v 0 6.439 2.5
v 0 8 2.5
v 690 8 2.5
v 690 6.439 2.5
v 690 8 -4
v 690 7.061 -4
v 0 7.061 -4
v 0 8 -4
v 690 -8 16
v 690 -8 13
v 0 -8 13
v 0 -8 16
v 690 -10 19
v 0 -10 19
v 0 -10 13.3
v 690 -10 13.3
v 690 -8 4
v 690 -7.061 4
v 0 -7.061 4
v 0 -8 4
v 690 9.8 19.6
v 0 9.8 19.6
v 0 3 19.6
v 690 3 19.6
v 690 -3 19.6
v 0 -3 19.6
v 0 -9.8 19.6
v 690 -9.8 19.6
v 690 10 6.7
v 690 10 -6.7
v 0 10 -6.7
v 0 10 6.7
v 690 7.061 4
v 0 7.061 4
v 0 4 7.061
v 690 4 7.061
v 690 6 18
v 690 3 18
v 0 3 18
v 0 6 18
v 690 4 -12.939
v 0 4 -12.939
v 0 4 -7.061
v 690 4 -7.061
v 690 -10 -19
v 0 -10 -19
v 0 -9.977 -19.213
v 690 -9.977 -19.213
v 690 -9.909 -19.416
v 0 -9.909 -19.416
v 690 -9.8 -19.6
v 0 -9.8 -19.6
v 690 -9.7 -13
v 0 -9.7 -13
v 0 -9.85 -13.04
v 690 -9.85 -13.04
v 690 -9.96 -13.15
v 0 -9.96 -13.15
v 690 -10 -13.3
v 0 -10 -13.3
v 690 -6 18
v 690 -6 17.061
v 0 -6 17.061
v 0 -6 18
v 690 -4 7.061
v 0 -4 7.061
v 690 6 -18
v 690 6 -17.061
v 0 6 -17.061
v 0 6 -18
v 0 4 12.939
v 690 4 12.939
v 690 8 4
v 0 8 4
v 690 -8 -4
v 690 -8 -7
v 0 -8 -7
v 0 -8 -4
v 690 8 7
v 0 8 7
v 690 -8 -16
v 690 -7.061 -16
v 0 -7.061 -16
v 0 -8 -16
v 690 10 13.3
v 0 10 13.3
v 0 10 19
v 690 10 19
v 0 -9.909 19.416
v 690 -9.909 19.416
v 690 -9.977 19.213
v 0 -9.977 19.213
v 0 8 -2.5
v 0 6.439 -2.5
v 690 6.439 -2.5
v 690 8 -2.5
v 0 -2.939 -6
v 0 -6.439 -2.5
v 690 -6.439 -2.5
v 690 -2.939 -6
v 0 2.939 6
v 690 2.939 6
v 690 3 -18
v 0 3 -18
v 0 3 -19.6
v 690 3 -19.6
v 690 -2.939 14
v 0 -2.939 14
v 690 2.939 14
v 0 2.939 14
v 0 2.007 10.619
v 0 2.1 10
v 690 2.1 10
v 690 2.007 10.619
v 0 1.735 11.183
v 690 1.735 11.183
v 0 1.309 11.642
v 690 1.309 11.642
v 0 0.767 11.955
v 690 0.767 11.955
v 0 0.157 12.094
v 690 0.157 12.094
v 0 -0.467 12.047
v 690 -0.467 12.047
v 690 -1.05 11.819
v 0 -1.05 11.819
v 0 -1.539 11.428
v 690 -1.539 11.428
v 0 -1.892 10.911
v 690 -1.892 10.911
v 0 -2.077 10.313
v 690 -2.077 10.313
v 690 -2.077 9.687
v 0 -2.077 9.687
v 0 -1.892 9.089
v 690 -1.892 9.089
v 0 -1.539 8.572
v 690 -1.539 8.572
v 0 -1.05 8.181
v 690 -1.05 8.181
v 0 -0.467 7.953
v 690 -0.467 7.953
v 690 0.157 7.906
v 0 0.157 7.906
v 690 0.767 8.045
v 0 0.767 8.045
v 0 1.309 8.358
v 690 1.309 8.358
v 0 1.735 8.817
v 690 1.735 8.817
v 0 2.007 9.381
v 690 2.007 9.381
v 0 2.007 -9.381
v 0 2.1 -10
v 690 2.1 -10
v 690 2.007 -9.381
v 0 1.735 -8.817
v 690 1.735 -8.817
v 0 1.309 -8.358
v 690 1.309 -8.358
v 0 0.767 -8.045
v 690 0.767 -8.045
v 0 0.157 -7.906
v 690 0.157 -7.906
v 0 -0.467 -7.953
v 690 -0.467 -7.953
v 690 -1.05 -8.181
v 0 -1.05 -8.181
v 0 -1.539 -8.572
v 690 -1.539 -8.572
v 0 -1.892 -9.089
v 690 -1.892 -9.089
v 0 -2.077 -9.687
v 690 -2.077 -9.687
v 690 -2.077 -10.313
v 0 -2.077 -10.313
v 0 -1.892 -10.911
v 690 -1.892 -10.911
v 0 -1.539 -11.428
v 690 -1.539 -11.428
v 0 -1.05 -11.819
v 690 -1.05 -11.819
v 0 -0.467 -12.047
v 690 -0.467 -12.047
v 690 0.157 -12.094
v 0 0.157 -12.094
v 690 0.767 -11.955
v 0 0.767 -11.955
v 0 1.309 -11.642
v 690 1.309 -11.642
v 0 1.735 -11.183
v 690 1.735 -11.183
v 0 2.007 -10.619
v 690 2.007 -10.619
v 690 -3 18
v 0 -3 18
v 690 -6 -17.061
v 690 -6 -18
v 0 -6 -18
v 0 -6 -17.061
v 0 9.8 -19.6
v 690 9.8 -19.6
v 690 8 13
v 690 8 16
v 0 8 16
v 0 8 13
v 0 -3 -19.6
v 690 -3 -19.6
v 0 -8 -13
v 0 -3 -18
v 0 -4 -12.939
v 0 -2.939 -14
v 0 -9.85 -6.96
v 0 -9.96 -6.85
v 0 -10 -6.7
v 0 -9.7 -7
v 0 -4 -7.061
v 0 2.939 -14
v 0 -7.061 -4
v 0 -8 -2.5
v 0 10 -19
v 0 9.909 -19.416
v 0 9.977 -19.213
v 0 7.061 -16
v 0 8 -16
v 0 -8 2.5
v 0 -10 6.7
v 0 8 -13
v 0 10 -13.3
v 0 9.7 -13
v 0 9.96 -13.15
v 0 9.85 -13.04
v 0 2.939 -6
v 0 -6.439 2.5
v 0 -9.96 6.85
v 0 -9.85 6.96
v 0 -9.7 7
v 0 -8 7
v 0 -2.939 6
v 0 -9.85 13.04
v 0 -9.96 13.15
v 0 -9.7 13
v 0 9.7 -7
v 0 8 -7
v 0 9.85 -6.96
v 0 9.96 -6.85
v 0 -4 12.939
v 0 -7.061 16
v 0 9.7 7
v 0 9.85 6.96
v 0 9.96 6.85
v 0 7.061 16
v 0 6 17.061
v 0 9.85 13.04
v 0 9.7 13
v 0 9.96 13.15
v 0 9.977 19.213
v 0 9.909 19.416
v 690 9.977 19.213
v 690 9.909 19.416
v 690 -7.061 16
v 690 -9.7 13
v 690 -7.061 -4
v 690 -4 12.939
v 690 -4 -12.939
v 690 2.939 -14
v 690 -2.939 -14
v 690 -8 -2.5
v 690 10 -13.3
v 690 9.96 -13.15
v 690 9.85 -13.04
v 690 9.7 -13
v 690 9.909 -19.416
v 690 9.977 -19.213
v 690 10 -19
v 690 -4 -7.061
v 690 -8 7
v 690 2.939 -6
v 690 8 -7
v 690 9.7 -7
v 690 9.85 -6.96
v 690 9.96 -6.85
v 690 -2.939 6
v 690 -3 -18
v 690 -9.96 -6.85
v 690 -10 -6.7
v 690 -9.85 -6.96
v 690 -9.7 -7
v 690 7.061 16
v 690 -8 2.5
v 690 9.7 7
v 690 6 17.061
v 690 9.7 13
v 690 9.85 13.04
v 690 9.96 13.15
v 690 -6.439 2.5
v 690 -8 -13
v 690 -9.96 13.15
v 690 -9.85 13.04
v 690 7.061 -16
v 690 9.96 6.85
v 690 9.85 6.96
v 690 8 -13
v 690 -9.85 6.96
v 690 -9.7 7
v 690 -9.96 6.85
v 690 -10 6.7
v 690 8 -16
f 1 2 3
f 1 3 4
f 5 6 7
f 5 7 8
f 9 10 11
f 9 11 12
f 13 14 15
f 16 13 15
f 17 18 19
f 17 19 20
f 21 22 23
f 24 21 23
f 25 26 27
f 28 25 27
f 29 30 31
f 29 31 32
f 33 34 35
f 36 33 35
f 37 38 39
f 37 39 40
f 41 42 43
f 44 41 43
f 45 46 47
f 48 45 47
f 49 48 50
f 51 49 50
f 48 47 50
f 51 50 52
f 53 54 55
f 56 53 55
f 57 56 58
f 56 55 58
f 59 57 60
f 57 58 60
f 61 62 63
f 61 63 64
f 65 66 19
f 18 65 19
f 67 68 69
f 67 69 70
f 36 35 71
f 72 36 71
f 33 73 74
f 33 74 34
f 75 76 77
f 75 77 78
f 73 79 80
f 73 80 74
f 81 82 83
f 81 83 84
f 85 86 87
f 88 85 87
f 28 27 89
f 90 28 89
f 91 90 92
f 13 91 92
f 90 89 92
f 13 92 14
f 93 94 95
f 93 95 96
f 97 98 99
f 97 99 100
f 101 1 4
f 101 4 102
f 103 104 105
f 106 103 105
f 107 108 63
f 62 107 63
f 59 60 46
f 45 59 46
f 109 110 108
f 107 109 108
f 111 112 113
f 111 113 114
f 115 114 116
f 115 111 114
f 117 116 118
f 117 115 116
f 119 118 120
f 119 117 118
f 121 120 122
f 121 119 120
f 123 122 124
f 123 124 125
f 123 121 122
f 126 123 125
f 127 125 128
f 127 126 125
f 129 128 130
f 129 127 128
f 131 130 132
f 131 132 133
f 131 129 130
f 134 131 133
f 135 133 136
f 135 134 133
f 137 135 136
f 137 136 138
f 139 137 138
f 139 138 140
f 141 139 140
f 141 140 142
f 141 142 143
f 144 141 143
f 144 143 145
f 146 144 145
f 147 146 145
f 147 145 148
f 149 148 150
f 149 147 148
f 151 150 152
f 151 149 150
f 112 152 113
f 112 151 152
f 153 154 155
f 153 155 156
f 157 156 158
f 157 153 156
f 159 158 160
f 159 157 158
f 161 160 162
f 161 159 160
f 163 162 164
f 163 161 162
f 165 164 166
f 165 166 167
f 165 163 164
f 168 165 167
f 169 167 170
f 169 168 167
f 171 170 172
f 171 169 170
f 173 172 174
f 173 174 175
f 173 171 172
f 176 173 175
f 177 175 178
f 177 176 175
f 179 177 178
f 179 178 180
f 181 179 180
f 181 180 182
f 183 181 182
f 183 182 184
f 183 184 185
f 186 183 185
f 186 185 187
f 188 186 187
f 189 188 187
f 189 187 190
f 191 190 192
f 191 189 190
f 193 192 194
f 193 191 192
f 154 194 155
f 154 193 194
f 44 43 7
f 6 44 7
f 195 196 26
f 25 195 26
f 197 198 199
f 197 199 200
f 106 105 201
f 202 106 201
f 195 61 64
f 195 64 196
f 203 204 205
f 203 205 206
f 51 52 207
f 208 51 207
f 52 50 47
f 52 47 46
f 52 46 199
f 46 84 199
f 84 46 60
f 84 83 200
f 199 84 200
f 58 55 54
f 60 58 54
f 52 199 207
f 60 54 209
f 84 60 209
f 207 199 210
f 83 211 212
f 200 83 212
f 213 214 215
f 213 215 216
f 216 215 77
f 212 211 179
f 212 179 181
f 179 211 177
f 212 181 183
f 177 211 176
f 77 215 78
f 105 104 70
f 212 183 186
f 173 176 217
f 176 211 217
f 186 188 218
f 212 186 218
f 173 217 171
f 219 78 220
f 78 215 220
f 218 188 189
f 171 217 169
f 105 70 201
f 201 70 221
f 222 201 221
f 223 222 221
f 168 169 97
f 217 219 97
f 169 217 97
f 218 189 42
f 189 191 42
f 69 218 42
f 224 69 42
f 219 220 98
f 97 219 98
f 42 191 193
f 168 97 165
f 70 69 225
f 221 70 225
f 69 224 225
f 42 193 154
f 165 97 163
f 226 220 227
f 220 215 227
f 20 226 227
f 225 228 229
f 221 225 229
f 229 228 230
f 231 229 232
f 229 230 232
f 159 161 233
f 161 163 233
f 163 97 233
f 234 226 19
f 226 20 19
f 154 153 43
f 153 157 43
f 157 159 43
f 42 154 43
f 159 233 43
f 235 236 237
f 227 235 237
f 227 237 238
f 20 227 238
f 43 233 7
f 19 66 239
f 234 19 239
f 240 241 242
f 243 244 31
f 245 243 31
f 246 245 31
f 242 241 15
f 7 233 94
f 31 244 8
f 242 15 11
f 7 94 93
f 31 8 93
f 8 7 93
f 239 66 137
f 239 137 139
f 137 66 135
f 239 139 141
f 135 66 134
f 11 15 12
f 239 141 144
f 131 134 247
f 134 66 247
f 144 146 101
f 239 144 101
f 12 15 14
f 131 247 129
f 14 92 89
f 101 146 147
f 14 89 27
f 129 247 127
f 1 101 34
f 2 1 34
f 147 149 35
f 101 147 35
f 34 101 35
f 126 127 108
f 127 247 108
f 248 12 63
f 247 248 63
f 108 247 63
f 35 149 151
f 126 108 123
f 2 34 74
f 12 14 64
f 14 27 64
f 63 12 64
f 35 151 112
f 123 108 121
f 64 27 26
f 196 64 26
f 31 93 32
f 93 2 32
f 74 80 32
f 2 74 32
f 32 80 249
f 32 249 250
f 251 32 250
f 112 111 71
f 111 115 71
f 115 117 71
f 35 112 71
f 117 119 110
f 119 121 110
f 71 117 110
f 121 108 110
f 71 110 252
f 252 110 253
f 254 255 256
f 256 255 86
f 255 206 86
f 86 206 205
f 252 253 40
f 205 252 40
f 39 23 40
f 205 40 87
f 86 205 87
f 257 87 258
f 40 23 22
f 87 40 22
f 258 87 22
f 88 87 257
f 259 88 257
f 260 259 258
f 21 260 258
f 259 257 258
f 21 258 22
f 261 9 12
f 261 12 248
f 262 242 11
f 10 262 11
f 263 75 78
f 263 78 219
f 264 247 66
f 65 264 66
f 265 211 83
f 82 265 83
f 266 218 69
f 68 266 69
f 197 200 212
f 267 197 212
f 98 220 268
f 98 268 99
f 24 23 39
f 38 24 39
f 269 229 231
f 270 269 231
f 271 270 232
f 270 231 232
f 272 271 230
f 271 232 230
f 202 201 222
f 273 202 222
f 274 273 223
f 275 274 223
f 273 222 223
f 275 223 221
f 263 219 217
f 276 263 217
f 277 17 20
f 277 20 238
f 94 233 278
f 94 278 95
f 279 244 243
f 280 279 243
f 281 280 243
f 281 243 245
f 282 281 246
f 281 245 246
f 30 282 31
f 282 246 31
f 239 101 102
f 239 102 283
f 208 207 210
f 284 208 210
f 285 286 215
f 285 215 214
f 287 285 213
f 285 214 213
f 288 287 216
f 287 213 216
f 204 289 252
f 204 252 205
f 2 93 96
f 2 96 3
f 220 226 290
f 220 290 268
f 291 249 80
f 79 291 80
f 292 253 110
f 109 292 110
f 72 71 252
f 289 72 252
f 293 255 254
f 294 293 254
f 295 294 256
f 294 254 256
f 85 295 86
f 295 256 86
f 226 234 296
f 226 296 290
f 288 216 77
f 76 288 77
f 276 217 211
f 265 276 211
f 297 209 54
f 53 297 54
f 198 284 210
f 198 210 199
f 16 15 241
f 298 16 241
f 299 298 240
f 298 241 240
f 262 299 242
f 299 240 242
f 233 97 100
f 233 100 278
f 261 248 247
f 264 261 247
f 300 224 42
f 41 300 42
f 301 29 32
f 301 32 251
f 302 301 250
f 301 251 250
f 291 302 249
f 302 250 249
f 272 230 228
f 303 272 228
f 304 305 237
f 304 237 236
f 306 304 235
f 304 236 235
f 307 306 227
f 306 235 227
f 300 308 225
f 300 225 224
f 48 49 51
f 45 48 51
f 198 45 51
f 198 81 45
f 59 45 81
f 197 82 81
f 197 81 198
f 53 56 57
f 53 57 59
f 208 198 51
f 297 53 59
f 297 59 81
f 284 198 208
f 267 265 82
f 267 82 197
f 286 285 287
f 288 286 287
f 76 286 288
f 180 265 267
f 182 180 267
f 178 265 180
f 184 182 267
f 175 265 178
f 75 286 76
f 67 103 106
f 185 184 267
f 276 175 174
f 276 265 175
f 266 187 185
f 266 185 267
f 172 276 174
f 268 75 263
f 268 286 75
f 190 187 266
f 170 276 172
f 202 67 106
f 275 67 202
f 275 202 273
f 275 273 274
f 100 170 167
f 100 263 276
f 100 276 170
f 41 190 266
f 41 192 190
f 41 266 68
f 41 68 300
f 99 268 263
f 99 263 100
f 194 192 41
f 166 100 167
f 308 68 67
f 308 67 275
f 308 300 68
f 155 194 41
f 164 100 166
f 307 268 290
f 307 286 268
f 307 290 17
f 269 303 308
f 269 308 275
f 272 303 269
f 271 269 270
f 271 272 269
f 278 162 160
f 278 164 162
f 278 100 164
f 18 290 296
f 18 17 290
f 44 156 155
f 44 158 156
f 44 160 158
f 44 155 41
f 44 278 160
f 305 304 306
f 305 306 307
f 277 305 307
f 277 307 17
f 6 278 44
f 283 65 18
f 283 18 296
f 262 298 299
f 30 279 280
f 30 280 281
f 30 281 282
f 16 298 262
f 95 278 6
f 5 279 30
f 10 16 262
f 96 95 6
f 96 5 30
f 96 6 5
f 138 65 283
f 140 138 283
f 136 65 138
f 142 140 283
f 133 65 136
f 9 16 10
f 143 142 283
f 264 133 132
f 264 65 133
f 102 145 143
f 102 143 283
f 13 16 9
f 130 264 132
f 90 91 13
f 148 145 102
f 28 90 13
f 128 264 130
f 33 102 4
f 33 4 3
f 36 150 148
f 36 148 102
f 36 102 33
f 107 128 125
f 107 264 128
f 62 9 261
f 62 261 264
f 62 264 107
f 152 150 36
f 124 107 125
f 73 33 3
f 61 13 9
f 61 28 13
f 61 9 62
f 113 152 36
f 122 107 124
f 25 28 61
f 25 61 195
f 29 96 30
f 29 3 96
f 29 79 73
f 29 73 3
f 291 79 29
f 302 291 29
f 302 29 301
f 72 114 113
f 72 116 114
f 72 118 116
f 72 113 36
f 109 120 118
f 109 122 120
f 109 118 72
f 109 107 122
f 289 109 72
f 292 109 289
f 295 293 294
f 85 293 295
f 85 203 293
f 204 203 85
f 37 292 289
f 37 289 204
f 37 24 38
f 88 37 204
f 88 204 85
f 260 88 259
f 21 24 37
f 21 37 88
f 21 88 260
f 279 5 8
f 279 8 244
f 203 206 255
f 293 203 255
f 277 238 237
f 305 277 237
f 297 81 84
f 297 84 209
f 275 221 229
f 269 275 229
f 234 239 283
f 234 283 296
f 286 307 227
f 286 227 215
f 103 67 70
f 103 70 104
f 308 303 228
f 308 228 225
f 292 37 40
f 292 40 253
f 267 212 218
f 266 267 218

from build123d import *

# Parameters (mm, degrees)
SKETCH_1_R              = 2.1
F_20XS5_20X40S5_1_DEPTH = 690


with BuildPart() as part:
    # 草图1 → 20xs5 20X40S5(1) (new body)
    with BuildSketch(Plane.YZ):
        with BuildLine():
            Line((-10, 19), (-10, 13.3))
            ThreePointArc((-10, 13.3), (-9.912132034, 13.087867966), (-9.7, 13))
            Line((-9.7, 13), (-8, 13))
            Line((-8, 13), (-8, 16))
            Line((-8, 16), (-7.060660172, 16))
            Line((-7.060660172, 16), (-4, 12.939339828))
            Line((-4, 12.939339828), (-4, 7.060660172))
            Line((-4, 7.060660172), (-7.060660172, 4))
            Line((-7.060660172, 4), (-8, 4))
            Line((-8, 4), (-8, 7))
            Line((-8, 7), (-9.7, 7))
            ThreePointArc((-9.7, 7), (-9.912132034, 6.912132034), (-10, 6.7))
            Line((-10, 6.7), (-10, -6.7))
            ThreePointArc((-10, -6.7), (-9.912132034, -6.912132034), (-9.7, -7))
            Line((-9.7, -7), (-8, -7))
            Line((-8, -7), (-8, -4))
            Line((-8, -4), (-7.060660172, -4))
            Line((-7.060660172, -4), (-4, -7.060660172))
            Line((-4, -7.060660172), (-4, -12.939339828))
            Line((-4, -12.939339828), (-7.060660172, -16))
            Line((-7.060660172, -16), (-8, -16))
            Line((-8, -16), (-8, -13))
            Line((-8, -13), (-9.7, -13))
            ThreePointArc((-9.7, -13), (-9.912132034, -13.087867966), (-10, -13.3))
            Line((-10, -13.3), (-10, -19))
            ThreePointArc((-10, -19), (-9.948683298, -19.316227766), (-9.8, -19.6))
            Line((-9.8, -19.6), (-3, -19.6))
            Line((-3, -19.6), (-3, -18))
            Line((-3, -18), (-6, -18))
            Line((-6, -18), (-6, -17.060660172))
            Line((-6, -17.060660172), (-2.939339828, -14))
            Line((-2.939339828, -14), (2.939339828, -14))
            Line((2.939339828, -14), (6, -17.060660172))
            Line((6, -17.060660172), (6, -18))
            Line((6, -18), (3, -18))
            Line((3, -18), (3, -19.6))
            Line((3, -19.6), (9.8, -19.6))
            ThreePointArc((9.8, -19.6), (9.948683298, -19.316227766), (10, -19))
            Line((10, -19), (10, -13.3))
            ThreePointArc((10, -13.3), (9.912132034, -13.087867966), (9.7, -13))
            Line((9.7, -13), (8, -13))
            Line((8, -13), (8, -16))
            Line((8, -16), (7.060660172, -16))
            Line((7.060660172, -16), (4, -12.939339828))
            Line((4, -12.939339828), (4, -7.060660172))
            Line((4, -7.060660172), (7.060660172, -4))
            Line((7.060660172, -4), (8, -4))
            Line((8, -4), (8, -7))
            Line((8, -7), (9.7, -7))
            ThreePointArc((9.7, -7), (9.912132034, -6.912132034), (10, -6.7))
            Line((10, -6.7), (10, 6.7))
            ThreePointArc((10, 6.7), (9.912132034, 6.912132034), (9.7, 7))
            Line((9.7, 7), (8, 7))
            Line((8, 7), (8, 4))
            Line((8, 4), (7.060660172, 4))
            Line((7.060660172, 4), (4, 7.060660172))
            Line((4, 7.060660172), (4, 12.939339828))
            Line((4, 12.939339828), (7.060660172, 16))
            Line((7.060660172, 16), (8, 16))
            Line((8, 16), (8, 13))
            Line((8, 13), (9.7, 13))
            ThreePointArc((9.7, 13), (9.912132034, 13.087867966), (10, 13.3))
            Line((10, 13.3), (10, 19))
            ThreePointArc((10, 19), (9.948683298, 19.316227766), (9.8, 19.6))
            Line((9.8, 19.6), (3, 19.6))
            Line((3, 19.6), (3, 18))
            Line((3, 18), (6, 18))
            Line((6, 18), (6, 17.060660172))
            Line((6, 17.060660172), (2.939339828, 14))
            Line((2.939339828, 14), (-2.939339828, 14))
            Line((-2.939339828, 14), (-6, 17.060660172))
            Line((-6, 17.060660172), (-6, 18))
            Line((-6, 18), (-3, 18))
            Line((-3, 18), (-3, 19.6))
            Line((-3, 19.6), (-9.8, 19.6))
            ThreePointArc((-9.8, 19.6), (-9.948683298, 19.316227766), (-10, 19))
        make_face()
        with Locations((0, -10)):
            Circle(SKETCH_1_R, mode=Mode.SUBTRACT)
        with Locations((0, 10)):
            Circle(SKETCH_1_R, mode=Mode.SUBTRACT)
        Polygon((-8, -2.5), (-6.439339828, -2.5), (-2.939339828, -6), (2.939339828, -6), (6.439339828, -2.5), (8, -2.5), (8, 2.5), (6.439339828, 2.5), (2.939339828, 6), (-2.939339828, 6), (-6.439339828, 2.5), (-8, 2.5), align=None, mode=Mode.SUBTRACT)
    extrude(amount=F_20XS5_20X40S5_1_DEPTH)


solid = part.part
